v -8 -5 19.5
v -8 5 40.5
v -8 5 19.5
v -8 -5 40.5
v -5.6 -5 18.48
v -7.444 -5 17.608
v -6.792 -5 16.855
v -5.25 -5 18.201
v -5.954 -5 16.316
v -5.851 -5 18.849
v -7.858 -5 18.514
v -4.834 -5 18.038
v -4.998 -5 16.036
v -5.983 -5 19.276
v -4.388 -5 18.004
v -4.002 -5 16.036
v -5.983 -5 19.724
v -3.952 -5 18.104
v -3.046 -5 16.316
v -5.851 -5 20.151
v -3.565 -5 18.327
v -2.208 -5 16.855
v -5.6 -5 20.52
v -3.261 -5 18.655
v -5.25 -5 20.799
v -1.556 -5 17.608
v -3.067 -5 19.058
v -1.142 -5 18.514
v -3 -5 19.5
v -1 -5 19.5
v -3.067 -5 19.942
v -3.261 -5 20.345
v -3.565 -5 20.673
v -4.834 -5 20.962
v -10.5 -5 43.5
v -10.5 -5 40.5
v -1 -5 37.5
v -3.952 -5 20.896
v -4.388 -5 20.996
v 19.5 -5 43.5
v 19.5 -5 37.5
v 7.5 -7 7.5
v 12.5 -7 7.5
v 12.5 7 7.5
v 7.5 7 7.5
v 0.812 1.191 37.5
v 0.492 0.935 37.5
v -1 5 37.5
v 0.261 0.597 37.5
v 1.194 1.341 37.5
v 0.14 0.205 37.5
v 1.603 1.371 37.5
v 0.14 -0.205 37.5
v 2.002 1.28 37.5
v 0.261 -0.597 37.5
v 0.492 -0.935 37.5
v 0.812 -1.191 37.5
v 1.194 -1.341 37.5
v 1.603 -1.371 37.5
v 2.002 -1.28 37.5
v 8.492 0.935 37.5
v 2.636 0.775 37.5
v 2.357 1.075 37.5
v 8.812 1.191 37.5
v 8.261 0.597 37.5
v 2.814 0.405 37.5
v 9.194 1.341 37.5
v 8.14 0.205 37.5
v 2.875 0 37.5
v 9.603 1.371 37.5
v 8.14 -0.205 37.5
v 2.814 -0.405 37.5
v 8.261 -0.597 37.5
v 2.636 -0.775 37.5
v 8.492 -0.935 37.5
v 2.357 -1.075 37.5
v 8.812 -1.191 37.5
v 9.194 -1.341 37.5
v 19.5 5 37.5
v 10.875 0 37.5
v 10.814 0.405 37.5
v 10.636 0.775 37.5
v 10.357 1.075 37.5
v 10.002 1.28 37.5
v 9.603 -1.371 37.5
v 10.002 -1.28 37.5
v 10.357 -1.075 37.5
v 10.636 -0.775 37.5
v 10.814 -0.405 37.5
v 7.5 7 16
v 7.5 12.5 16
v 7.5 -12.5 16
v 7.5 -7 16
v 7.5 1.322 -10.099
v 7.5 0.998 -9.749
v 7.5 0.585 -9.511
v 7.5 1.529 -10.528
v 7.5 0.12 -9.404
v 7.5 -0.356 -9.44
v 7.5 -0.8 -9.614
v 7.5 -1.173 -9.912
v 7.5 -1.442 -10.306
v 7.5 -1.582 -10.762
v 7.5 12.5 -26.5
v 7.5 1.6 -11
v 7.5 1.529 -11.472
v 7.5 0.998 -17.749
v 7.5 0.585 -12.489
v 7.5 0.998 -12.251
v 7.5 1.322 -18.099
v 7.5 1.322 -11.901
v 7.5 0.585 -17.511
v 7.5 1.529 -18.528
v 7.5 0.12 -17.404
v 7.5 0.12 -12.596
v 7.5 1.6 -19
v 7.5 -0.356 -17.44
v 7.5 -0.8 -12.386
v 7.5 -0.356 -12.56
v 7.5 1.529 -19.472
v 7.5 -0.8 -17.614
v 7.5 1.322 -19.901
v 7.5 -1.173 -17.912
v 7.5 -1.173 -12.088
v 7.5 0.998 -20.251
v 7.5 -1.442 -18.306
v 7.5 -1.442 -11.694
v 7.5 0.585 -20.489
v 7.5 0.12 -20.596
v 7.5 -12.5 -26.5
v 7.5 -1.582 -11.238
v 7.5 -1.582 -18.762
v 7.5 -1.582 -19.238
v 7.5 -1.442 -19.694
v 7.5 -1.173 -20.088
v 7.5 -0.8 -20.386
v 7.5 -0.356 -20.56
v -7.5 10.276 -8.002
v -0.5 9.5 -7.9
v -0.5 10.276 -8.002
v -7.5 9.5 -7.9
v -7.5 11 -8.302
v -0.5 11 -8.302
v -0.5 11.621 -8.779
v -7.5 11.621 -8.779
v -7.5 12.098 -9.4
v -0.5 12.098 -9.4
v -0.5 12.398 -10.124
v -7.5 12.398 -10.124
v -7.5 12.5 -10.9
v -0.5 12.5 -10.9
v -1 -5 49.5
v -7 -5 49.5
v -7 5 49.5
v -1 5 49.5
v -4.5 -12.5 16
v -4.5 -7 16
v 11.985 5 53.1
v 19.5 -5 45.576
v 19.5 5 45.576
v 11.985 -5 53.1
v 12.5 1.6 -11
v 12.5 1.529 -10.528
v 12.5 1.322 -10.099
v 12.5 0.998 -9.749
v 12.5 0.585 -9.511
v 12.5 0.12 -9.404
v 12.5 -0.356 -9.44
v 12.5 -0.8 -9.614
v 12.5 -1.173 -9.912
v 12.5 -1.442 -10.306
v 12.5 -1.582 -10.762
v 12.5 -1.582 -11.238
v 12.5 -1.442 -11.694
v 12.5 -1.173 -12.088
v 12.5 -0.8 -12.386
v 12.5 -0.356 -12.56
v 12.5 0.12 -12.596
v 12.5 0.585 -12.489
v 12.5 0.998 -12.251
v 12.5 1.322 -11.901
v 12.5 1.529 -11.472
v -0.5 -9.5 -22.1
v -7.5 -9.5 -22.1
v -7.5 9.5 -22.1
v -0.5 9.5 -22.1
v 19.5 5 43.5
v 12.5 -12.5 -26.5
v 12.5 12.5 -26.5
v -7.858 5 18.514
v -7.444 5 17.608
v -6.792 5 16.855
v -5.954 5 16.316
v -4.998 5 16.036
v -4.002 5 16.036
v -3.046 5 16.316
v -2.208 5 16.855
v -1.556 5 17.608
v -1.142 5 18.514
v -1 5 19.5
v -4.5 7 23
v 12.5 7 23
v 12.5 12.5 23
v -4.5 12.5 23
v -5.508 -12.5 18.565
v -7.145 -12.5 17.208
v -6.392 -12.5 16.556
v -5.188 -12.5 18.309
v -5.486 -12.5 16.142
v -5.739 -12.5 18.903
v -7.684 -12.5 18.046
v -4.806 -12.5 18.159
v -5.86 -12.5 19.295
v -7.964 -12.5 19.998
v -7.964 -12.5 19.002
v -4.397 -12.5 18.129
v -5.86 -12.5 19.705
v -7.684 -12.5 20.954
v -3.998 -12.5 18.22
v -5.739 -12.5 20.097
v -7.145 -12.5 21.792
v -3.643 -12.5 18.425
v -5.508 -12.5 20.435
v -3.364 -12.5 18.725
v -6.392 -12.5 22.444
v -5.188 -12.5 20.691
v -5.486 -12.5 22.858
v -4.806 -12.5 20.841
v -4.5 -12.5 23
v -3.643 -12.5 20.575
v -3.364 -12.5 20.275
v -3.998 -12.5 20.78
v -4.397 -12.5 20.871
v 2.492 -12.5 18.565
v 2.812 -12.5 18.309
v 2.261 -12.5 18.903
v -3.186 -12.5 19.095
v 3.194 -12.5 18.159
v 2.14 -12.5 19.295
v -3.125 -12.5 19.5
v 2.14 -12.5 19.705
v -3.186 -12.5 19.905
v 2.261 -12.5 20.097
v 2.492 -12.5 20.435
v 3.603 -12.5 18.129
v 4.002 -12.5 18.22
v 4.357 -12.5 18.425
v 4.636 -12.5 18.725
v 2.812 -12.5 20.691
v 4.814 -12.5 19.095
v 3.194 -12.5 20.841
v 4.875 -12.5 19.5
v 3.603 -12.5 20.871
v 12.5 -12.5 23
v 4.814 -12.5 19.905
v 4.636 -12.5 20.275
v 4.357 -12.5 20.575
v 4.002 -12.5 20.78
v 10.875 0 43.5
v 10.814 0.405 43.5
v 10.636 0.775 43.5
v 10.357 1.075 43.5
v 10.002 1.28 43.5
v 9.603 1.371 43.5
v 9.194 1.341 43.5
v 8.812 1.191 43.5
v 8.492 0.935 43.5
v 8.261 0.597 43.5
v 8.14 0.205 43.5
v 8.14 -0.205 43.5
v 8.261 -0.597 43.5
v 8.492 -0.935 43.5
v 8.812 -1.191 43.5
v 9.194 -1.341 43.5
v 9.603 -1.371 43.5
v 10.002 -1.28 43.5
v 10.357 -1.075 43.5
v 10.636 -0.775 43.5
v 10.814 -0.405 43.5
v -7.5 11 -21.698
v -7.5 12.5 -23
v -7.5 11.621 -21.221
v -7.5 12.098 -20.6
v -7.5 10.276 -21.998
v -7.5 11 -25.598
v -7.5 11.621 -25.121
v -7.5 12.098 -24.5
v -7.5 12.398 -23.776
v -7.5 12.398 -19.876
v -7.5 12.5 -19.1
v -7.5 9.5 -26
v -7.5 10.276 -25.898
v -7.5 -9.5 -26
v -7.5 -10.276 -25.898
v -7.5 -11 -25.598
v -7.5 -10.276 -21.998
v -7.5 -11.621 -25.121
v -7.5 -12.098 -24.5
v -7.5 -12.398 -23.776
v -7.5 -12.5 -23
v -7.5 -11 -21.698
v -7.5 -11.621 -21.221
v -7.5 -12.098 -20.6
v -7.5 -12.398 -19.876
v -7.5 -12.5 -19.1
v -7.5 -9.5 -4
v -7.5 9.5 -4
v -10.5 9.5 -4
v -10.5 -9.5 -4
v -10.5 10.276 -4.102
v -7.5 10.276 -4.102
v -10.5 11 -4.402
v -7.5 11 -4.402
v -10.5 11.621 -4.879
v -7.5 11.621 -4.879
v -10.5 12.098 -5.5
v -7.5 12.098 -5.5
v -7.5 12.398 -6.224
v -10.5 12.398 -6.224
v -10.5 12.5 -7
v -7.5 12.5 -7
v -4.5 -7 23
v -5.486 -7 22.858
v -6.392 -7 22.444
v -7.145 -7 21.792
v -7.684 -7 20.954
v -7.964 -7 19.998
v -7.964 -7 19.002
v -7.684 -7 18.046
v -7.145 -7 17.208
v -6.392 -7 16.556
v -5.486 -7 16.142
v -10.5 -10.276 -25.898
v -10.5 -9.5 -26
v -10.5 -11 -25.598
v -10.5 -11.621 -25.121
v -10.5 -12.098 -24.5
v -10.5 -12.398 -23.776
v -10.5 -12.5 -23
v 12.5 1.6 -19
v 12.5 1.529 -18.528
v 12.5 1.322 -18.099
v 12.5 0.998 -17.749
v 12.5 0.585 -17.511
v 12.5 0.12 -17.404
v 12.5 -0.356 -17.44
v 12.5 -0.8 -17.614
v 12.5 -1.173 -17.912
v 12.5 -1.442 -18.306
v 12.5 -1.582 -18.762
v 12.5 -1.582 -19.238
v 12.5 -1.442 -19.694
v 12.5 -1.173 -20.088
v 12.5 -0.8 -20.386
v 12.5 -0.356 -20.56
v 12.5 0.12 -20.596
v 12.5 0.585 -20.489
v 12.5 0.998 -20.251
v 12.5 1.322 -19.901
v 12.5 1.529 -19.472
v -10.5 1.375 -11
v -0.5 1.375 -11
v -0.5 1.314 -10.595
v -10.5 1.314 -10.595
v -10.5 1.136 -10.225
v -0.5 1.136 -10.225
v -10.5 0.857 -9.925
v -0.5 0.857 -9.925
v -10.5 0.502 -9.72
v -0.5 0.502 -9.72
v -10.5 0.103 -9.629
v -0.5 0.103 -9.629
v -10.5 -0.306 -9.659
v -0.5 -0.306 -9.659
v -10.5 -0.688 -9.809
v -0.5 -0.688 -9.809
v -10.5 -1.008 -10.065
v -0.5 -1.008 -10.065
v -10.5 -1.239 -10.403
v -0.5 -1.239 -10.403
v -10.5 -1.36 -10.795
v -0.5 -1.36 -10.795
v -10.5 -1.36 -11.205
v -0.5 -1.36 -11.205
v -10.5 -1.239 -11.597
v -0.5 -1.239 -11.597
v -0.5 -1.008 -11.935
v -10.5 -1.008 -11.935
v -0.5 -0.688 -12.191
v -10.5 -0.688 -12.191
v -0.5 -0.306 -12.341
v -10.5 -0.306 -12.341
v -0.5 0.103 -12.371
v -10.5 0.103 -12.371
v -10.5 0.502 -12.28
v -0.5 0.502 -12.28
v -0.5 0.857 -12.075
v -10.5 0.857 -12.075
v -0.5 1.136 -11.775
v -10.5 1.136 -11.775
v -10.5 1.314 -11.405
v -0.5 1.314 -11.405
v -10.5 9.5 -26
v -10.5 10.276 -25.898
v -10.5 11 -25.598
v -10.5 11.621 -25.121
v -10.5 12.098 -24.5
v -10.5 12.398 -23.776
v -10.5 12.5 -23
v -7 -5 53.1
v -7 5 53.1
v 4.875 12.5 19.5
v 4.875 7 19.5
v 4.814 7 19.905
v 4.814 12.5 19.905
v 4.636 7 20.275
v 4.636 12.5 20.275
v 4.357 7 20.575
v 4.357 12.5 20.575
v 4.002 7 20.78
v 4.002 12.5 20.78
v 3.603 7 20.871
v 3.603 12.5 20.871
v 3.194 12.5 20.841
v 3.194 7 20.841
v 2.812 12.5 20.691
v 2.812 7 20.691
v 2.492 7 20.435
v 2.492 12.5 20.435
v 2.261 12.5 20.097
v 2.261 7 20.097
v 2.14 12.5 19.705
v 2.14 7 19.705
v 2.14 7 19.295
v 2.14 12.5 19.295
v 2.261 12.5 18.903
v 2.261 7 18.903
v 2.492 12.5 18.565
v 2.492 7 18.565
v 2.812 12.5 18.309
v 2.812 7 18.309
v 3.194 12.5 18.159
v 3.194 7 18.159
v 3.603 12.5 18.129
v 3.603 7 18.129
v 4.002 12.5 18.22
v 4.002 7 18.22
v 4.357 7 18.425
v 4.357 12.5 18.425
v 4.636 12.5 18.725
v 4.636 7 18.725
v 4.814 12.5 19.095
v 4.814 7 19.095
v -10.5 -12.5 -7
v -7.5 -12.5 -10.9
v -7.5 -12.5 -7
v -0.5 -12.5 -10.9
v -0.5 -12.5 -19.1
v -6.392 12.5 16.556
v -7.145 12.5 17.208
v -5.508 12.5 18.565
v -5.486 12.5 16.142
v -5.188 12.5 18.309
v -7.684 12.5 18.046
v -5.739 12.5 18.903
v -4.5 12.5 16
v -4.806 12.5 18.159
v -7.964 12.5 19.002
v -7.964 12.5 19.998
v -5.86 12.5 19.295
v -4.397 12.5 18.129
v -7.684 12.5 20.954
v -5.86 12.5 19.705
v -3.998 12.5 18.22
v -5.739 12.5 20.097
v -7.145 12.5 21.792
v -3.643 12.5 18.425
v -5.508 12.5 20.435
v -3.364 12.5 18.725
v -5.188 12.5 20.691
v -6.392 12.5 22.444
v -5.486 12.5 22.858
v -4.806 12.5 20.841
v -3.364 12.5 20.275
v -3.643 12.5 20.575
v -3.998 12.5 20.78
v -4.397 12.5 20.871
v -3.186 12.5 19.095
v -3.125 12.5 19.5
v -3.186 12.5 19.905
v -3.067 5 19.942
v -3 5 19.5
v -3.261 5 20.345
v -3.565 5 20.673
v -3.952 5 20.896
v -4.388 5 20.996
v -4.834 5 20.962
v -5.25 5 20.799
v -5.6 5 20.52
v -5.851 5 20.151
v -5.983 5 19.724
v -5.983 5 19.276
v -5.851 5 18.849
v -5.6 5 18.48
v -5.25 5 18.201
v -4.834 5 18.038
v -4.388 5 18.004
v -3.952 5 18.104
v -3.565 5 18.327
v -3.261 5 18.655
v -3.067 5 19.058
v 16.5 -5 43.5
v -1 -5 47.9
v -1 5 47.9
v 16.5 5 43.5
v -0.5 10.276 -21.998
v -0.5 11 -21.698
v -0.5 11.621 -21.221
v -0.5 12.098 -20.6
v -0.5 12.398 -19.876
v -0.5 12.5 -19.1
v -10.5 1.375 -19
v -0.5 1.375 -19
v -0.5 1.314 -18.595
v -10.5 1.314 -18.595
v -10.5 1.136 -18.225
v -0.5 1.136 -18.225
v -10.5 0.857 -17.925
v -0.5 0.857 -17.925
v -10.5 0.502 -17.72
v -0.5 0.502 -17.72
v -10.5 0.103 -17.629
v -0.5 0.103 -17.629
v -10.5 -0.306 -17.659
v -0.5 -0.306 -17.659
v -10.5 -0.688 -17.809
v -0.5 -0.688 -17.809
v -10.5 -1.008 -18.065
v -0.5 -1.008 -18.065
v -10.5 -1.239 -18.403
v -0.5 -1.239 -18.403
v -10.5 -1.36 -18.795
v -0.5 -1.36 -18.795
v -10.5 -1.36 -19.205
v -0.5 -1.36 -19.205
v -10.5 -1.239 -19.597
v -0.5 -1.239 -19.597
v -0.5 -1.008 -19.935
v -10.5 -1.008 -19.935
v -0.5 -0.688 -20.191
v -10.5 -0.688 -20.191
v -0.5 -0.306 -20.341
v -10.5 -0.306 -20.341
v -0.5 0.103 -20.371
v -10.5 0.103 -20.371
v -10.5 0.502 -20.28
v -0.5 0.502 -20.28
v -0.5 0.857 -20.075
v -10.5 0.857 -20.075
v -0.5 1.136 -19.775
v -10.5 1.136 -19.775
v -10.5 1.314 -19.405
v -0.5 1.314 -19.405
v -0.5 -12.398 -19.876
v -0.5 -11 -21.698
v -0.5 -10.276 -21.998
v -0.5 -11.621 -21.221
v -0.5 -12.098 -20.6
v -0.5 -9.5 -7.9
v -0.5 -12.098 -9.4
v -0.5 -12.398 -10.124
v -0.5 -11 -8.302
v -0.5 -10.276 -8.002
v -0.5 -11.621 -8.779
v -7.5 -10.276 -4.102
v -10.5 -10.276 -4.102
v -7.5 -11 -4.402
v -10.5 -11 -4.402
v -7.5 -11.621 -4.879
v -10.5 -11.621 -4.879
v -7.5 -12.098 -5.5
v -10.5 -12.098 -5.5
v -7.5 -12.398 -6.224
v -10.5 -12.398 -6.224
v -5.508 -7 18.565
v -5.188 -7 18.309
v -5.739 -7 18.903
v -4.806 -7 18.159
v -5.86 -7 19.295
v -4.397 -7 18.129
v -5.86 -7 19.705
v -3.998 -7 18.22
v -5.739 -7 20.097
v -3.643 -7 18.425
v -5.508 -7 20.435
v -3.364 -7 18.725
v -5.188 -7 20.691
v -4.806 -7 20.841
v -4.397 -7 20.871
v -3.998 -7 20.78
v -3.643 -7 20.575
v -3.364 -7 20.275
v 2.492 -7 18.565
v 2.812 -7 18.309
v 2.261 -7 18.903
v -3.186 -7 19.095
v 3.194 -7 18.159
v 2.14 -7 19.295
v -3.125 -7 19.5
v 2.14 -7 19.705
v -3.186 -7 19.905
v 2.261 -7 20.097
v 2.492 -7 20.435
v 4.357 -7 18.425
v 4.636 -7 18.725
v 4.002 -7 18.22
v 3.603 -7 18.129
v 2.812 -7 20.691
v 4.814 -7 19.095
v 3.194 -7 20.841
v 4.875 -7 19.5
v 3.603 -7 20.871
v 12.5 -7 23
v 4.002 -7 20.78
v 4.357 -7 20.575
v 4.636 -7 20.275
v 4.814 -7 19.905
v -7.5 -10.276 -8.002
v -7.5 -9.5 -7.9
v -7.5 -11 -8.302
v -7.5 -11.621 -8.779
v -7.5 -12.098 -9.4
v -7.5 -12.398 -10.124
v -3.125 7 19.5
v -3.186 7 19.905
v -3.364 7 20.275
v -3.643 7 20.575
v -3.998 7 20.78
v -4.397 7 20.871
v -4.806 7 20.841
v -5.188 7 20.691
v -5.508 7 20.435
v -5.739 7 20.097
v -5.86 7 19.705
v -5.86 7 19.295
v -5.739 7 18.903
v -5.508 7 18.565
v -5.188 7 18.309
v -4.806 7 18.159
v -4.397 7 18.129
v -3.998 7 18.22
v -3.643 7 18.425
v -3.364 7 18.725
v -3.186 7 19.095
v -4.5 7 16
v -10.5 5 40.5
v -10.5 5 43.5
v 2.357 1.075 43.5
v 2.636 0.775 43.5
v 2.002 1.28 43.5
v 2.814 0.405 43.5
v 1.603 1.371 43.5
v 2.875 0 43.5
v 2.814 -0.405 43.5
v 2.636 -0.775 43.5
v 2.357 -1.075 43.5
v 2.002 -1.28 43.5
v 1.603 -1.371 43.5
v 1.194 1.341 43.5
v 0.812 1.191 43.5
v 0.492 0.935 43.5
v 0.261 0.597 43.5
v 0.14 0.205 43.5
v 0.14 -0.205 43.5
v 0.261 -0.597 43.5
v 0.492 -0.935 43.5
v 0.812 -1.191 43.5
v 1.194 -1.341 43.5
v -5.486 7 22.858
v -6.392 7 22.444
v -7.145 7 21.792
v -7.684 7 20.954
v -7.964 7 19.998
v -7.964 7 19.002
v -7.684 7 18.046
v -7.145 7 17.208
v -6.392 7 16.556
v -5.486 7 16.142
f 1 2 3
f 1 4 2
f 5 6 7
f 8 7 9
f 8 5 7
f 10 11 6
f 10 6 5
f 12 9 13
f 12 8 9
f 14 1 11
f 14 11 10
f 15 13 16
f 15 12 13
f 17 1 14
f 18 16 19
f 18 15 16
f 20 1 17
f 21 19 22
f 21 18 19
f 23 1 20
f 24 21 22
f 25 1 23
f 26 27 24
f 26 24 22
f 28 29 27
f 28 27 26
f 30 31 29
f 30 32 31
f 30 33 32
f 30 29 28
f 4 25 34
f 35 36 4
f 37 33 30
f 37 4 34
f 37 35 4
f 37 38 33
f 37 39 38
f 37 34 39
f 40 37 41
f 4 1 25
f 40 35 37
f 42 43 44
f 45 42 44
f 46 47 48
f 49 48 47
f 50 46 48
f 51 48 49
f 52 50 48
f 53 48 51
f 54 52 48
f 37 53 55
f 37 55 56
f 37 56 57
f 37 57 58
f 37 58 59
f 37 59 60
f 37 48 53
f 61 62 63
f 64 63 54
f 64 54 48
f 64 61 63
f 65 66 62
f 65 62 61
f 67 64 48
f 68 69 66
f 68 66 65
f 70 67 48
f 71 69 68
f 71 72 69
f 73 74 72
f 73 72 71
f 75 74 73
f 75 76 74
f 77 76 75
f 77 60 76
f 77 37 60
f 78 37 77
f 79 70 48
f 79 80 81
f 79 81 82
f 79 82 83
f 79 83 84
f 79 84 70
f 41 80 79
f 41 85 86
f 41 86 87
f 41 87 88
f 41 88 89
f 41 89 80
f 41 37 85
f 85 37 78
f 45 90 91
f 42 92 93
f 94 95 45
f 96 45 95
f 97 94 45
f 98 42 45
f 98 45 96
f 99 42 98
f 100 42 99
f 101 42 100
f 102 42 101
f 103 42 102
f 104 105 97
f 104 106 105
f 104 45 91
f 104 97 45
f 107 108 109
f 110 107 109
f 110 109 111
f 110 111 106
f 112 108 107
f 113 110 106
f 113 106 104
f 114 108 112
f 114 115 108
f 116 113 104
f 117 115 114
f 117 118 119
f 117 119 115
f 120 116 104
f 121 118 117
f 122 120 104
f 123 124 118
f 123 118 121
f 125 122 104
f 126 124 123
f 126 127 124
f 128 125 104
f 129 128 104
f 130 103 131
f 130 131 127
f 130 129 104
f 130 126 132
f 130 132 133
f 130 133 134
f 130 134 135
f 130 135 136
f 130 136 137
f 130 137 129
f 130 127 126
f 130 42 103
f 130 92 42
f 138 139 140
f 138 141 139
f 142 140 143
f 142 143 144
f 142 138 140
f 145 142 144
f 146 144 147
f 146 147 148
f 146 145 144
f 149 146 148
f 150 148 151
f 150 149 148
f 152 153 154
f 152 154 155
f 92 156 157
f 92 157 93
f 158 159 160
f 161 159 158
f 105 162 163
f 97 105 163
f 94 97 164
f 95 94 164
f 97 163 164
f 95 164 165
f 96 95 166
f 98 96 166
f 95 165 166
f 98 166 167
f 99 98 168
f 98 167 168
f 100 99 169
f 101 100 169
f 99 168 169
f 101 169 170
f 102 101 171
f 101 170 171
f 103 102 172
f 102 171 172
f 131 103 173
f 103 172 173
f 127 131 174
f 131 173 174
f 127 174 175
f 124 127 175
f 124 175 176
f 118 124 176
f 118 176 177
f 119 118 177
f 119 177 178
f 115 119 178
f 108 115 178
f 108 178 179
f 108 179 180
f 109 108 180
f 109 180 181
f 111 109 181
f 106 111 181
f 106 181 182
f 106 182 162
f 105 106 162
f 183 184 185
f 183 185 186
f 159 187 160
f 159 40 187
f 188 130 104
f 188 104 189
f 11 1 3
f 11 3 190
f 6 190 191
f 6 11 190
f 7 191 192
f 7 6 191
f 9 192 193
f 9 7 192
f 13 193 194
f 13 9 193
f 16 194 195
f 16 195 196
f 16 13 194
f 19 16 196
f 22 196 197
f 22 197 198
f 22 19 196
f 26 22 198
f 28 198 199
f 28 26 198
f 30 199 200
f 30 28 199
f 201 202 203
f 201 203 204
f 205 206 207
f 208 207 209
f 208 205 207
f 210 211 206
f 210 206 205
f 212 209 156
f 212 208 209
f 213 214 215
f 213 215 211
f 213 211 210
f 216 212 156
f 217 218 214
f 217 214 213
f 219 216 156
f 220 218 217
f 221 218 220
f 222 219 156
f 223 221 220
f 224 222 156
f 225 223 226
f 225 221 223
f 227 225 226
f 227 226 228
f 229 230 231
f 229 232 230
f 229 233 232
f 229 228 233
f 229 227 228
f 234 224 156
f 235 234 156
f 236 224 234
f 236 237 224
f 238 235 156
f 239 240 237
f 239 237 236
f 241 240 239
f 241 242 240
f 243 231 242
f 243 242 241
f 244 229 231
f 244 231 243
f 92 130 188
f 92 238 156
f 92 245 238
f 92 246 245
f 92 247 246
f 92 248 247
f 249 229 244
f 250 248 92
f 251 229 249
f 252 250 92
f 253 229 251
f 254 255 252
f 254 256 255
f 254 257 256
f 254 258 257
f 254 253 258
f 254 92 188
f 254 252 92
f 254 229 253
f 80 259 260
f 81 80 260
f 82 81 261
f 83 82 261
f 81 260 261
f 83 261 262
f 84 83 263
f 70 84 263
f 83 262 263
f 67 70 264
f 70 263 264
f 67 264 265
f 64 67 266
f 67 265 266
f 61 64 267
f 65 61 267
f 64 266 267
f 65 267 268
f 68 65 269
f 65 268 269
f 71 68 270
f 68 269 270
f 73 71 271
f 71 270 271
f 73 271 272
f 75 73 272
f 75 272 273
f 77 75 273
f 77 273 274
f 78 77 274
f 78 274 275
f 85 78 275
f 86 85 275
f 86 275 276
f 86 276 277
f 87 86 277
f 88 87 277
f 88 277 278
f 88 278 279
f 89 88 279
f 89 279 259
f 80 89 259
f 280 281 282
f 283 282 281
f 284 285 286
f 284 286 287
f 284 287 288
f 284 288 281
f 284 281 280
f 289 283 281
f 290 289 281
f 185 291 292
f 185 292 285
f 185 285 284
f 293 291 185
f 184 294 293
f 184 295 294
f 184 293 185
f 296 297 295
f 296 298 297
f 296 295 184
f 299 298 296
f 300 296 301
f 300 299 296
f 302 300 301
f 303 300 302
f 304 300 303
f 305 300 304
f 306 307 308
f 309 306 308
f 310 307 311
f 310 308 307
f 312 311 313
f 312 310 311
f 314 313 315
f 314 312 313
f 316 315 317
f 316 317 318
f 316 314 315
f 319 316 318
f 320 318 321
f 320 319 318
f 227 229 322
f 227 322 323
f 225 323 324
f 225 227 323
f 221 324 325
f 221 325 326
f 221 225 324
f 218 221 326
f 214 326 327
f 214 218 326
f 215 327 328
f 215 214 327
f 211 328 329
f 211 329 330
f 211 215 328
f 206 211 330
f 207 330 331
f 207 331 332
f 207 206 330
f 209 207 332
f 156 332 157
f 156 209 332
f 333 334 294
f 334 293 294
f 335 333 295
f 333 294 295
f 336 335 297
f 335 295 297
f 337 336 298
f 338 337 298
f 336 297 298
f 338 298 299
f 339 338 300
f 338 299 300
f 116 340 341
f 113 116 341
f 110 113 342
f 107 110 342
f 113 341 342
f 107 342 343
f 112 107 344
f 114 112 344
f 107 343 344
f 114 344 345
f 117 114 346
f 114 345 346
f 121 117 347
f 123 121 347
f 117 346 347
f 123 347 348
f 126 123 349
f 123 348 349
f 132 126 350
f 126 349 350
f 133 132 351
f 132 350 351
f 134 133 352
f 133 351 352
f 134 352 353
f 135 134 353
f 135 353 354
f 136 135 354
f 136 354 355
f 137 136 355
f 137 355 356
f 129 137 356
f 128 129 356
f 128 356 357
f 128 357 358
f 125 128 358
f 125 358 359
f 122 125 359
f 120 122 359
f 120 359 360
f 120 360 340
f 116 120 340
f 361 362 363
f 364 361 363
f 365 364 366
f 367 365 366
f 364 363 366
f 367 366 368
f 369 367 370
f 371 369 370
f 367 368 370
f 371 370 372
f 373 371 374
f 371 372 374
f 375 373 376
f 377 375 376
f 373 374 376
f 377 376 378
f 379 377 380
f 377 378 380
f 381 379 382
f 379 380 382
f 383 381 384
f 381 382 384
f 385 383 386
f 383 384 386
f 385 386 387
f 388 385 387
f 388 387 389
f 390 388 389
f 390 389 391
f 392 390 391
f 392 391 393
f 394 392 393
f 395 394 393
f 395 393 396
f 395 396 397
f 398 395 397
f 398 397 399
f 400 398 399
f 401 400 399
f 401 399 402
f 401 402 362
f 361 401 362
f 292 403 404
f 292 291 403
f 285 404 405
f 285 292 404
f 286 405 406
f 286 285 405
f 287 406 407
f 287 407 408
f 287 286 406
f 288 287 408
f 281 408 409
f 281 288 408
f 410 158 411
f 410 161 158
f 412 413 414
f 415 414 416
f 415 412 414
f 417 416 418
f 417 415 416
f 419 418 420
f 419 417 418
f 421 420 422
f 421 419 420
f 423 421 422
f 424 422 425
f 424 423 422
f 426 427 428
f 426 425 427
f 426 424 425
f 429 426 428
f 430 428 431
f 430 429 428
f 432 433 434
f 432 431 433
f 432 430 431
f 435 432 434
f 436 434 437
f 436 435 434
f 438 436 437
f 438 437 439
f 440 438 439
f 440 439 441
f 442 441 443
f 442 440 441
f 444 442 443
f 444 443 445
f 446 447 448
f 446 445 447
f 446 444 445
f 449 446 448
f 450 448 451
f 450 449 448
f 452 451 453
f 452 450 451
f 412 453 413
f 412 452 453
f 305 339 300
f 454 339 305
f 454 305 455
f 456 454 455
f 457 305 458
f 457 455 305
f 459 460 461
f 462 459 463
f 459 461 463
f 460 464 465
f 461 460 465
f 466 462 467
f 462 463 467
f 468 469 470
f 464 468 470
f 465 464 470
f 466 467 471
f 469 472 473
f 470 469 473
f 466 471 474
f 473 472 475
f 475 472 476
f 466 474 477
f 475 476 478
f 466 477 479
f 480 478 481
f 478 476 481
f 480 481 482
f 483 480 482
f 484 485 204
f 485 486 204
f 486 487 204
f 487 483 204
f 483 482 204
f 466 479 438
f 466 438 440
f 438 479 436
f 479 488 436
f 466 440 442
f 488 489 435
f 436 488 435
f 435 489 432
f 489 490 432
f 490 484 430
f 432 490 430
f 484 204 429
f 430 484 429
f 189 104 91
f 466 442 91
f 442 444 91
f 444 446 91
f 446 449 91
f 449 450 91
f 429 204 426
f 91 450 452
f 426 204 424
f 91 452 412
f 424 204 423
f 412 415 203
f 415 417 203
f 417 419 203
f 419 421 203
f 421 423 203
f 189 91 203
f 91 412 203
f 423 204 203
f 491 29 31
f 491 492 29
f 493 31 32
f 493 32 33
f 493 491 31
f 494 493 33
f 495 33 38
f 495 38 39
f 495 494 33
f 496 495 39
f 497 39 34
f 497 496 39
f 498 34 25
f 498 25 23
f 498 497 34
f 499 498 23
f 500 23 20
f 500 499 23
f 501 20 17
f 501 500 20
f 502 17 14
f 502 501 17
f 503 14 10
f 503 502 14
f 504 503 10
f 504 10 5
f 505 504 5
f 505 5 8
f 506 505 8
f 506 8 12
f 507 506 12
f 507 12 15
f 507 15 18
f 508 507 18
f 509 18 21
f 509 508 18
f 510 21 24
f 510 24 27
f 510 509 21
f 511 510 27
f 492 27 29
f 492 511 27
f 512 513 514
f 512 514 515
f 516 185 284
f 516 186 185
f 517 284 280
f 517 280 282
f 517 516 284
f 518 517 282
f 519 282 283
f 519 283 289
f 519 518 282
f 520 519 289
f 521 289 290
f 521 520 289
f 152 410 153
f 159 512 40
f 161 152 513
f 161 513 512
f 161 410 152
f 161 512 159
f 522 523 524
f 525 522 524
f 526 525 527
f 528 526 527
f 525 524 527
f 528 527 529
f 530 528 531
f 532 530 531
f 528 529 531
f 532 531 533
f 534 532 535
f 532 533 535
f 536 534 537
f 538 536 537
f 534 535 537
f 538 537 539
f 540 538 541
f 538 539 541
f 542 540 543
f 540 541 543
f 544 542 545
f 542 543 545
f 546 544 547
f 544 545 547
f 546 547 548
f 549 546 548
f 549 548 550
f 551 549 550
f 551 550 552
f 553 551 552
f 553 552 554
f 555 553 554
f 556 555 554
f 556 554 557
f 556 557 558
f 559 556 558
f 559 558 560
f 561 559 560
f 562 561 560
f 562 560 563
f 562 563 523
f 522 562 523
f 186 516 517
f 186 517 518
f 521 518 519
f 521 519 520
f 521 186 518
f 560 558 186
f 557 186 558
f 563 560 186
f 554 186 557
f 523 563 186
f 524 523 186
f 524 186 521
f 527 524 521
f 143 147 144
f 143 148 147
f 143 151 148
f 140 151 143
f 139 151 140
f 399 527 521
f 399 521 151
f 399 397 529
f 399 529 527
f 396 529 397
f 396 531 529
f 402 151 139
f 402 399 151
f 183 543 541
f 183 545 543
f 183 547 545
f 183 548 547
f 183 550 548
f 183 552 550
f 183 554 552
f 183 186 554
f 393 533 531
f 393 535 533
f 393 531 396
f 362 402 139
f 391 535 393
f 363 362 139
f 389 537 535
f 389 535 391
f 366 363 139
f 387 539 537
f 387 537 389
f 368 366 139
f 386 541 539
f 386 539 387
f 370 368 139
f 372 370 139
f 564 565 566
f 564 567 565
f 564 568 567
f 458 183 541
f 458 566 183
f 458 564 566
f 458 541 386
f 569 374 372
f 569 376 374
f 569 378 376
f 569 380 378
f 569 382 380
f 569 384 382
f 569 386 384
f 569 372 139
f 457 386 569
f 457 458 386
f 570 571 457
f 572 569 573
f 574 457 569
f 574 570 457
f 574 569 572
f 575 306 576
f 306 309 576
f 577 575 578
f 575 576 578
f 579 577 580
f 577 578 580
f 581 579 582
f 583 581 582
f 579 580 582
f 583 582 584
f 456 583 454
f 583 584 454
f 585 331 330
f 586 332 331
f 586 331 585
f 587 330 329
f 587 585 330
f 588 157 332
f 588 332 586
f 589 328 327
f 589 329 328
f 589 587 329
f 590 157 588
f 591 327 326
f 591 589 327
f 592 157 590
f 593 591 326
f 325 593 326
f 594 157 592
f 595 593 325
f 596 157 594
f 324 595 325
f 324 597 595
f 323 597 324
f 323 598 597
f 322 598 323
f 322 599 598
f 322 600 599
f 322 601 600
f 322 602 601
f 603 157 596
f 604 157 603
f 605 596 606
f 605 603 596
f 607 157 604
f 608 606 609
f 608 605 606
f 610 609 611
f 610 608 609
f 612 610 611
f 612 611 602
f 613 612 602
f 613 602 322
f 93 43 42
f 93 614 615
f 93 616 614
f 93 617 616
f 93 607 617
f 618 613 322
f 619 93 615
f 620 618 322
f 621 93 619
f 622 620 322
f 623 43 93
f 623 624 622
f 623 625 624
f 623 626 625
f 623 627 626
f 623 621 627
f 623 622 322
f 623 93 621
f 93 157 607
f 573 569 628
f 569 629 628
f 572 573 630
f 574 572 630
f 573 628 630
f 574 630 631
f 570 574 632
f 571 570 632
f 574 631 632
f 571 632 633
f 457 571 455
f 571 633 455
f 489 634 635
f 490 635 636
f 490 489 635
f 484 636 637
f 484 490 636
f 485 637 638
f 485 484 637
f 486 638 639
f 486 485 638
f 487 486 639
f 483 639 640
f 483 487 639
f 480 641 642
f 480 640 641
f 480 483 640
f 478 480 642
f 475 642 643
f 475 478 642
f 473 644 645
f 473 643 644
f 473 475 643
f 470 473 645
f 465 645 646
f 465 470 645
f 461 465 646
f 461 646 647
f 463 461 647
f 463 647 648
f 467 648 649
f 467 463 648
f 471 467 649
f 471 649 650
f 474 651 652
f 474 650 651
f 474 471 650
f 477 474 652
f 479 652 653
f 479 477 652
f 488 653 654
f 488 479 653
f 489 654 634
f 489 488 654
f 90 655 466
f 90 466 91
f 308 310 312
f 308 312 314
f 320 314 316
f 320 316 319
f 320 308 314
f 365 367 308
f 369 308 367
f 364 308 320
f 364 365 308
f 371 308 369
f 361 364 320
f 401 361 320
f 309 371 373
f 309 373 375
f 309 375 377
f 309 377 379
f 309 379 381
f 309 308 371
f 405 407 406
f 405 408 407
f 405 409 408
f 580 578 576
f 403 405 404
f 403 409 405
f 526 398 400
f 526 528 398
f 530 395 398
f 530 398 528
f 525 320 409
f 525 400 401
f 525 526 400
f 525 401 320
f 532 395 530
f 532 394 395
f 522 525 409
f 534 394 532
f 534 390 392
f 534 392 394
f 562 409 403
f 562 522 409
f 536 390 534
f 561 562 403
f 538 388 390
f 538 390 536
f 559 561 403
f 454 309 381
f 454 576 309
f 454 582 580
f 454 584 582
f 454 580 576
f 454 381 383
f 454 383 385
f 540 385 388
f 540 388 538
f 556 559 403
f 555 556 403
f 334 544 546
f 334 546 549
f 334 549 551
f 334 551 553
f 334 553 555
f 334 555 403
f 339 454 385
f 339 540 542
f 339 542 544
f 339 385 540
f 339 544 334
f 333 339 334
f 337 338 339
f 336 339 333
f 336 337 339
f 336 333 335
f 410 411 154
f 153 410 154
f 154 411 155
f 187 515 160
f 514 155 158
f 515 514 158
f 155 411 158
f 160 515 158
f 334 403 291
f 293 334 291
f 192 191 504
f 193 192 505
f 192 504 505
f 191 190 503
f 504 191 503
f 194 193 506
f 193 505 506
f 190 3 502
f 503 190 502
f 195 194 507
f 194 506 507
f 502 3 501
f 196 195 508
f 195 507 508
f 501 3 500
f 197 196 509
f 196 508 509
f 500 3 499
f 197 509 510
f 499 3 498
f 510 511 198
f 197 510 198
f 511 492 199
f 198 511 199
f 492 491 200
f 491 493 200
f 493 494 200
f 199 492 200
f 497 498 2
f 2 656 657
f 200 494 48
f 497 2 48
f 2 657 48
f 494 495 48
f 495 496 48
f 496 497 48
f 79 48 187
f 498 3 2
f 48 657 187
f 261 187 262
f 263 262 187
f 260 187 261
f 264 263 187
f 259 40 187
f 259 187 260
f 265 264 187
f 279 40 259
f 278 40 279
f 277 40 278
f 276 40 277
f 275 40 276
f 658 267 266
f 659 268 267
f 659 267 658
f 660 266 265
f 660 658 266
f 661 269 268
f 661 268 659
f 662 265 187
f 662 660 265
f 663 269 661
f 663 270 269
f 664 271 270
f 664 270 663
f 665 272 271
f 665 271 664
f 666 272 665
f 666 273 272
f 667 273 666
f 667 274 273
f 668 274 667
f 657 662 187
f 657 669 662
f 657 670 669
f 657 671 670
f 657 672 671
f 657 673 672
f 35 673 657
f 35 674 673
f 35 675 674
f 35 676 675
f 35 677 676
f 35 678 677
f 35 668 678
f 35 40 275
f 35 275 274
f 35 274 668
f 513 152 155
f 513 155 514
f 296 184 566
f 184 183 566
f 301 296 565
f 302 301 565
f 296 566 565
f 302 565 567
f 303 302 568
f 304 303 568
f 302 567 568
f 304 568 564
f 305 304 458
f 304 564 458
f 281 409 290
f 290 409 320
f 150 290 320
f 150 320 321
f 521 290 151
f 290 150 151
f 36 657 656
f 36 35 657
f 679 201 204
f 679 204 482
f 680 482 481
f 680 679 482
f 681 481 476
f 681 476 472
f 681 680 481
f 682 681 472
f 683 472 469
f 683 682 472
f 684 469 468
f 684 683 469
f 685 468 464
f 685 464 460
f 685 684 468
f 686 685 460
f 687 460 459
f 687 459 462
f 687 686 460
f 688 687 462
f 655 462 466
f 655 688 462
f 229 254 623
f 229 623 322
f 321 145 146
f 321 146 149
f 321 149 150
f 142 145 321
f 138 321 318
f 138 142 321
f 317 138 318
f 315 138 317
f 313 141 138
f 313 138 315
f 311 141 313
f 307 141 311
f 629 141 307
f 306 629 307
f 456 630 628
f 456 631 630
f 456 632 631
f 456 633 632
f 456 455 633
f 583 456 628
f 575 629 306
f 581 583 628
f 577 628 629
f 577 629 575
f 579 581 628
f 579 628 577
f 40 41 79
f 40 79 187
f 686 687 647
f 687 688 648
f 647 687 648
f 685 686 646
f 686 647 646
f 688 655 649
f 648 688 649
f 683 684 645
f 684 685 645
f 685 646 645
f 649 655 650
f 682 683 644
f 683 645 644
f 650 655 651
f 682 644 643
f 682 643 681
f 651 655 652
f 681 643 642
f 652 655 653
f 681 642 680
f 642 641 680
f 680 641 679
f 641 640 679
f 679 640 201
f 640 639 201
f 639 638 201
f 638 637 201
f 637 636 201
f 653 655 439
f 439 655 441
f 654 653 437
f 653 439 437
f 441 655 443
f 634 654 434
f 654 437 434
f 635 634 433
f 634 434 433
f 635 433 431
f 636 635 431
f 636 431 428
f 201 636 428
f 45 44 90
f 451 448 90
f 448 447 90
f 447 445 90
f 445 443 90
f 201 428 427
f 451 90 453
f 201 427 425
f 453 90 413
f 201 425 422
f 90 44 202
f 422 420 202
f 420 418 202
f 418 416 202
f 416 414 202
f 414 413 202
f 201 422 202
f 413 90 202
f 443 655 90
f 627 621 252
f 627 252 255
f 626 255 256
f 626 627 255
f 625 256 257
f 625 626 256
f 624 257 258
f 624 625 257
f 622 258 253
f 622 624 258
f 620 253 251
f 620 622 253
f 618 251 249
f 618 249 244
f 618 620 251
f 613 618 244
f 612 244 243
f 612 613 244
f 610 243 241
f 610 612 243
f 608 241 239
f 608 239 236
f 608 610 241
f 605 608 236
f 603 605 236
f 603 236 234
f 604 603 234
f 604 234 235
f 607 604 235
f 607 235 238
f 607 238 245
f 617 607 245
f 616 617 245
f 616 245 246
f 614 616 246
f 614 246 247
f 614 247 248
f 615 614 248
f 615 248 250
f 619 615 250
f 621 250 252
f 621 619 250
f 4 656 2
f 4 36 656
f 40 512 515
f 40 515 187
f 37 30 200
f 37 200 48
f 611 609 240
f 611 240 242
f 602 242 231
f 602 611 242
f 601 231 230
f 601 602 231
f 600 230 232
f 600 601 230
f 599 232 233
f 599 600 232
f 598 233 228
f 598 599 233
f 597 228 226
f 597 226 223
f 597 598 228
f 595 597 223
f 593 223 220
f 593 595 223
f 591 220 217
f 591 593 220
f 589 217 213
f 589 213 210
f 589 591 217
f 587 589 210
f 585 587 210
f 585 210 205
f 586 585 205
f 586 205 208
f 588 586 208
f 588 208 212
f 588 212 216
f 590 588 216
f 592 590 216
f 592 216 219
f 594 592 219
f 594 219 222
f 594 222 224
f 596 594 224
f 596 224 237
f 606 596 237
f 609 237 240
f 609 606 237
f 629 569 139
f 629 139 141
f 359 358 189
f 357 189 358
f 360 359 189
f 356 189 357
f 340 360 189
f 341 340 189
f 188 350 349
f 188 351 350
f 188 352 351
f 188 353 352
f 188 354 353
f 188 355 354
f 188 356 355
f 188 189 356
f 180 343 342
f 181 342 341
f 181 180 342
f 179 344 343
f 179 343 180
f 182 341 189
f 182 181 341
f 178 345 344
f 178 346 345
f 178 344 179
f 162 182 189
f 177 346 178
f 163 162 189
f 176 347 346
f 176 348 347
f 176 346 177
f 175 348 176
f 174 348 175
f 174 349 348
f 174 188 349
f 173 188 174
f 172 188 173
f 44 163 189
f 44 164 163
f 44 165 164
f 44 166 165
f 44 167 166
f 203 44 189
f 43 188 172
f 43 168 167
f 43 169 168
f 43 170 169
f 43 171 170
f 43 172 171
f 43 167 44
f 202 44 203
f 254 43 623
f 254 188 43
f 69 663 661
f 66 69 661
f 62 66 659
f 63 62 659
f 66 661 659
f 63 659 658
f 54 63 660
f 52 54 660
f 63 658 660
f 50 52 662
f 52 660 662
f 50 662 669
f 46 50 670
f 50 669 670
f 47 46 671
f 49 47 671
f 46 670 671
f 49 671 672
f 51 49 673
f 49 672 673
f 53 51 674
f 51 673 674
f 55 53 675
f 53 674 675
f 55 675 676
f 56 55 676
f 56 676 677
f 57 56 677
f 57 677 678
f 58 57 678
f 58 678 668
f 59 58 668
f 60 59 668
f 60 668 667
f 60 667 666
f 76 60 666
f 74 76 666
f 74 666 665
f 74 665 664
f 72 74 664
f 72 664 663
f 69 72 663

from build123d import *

# Parameters (mm, degrees)
F2_DEPTH  = 12.5
F3_R      = 3
F4_R      = 1.375
F5_DEPTH  = 10.001
F6_R      = 1.375
F7_DEPTH  = 12.5
F8_W      = 14
F8_H      = 15.5
F8_R      = 1.6
F9_DEPTH  = 23.001
F10_R     = 1.5
F11_DEPTH = 5
F12_R     = 1.375
F13_DEPTH = 12
F15_DEPTH = 5


with BuildPart() as f2:
    # F1 (on Front) → F2 (new body, symmetric)
    with BuildSketch(Plane.XZ):
        Polygon((-7.5, -4), (-10.5, -4), (-10.5, -26), (-7.5, -26), (-7.5, -22.1), (-0.5, -22.1), (-0.5, -7.9), (-7.5, -7.9), align=None)
    extrude(amount=F2_DEPTH, both=True)

    # F3
    f3_edges = [f2.edges().sort_by_distance(p)[0] for p in [
        (-4, -12.5, -7.9),
        (-9, -12.5, -4),
        (-9, -12.5, -26),
        (-4, -12.5, -22.1),
        (-4, 12.5, -7.9),
        (-9, 12.5, -4),
        (-9, 12.5, -26),
        (-4, 12.5, -22.1),
    ]]
    fillet(f3_edges, radius=F3_R)

    # F4 (on face) → F5 (cut, through all)
    with BuildSketch(Plane.YZ.offset(-0.5)):
        with Locations((0, -11)):
            Circle(F4_R)
        with Locations((0, -19)):
            Circle(F4_R)
    extrude(amount=-F5_DEPTH, mode=Mode.SUBTRACT)


with BuildPart() as f7:
    # F6 (on Front) → F7 (new body, symmetric)
    with BuildSketch(Plane.XZ):
        with BuildLine():
            ThreePointArc((-4.5, 23), (-8, 19.5), (-4.5, 16))
            Line((-4.5, 16), (7.5, 16))
            Line((7.5, 16), (7.5, -26.5))
            Line((7.5, -26.5), (12.5, -26.5))
            Line((12.5, -26.5), (12.5, 23))
            Line((12.5, 23), (-4.5, 23))
        make_face()
        with Locations((-4.5, 19.5)):
            Circle(F6_R, mode=Mode.SUBTRACT)
        with Locations((3.5, 19.5)):
            Circle(F6_R, mode=Mode.SUBTRACT)
    extrude(amount=F7_DEPTH, both=True)

    # F8 (on face) → F9 (cut, through all)
    with BuildSketch(Plane.YZ.offset(12.5)):
        with Locations((0, 15.25)):
            Rectangle(F8_W, F8_H)
        with Locations((0, -11)):
            Circle(F8_R)
        with Locations((0, -19)):
            Circle(F8_R)
    extrude(amount=-F9_DEPTH, mode=Mode.SUBTRACT)


with BuildPart() as f11:
    # F10 (on Front) → F11 (new body, symmetric)
    with BuildSketch(Plane.XZ):
        with BuildLine():
            Line((-8, 40.5), (-8, 19.5))
            ThreePointArc((-8, 19.5), (-4.5, 16), (-1, 19.5))
            Line((-1, 19.5), (-1, 37.5))
            Line((-1, 37.5), (19.5, 37.5))
            Line((19.5, 37.5), (19.5, 43.5))
            Line((19.5, 43.5), (-10.5, 43.5))
            Line((-10.5, 43.5), (-10.5, 40.5))
            Line((-10.5, 40.5), (-8, 40.5))
        make_face()
        with Locations((-4.5, 19.5)):
            Circle(F10_R, mode=Mode.SUBTRACT)
    extrude(amount=F11_DEPTH, both=True)

    # F12 (on face) → F13 (cut)
    with BuildSketch(Plane.XY.offset(43.5)):
        with Locations((1.5, 0)):
            Circle(F12_R)
        with Locations((9.5, 0)):
            Circle(F12_R)
    extrude(amount=-F13_DEPTH, mode=Mode.SUBTRACT)


with BuildPart() as f15:
    # F14 (on Front) → F15 (new body, symmetric)
    with BuildSketch(Plane.XZ):
        Polygon((11.984648183, 53.1), (-7, 53.1), (-7, 49.5), (-1, 49.5), (-1, 47.9), (16.5, 43.5), (19.5, 43.5), (19.5, 45.5762408674), align=None)
    extrude(amount=F15_DEPTH, both=True)


solid = Compound([f2.part, f7.part, f11.part, f15.part])
